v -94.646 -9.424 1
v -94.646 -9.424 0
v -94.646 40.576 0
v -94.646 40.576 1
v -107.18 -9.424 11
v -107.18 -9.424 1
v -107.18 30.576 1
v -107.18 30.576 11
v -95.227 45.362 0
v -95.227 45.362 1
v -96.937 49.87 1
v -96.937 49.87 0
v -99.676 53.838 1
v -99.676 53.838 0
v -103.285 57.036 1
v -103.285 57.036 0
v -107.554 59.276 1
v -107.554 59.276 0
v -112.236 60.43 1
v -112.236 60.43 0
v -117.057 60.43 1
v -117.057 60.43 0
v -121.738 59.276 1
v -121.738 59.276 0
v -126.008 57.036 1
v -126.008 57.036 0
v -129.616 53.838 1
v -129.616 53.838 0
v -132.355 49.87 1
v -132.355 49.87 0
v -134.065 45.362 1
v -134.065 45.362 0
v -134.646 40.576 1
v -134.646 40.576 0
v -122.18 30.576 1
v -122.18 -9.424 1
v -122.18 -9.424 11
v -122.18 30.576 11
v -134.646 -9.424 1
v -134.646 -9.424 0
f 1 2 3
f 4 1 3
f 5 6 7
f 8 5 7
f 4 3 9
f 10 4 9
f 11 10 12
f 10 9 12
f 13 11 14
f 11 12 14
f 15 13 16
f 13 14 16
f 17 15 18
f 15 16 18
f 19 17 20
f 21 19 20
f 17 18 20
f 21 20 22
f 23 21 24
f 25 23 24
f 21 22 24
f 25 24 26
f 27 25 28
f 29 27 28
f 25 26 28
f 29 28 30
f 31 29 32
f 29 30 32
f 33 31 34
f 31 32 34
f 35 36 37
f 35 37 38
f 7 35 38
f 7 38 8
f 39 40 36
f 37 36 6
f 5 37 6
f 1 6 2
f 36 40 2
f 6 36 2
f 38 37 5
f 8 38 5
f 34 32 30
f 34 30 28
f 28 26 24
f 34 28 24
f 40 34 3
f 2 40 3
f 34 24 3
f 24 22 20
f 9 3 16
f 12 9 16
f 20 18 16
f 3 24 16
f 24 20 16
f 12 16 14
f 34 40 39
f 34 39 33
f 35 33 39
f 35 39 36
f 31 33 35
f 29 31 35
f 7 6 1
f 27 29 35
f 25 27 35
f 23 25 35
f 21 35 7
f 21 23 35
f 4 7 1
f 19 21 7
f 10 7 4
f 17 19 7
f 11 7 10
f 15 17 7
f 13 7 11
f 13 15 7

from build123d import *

# Parameters (mm, degrees)
F0_W     = 40
F0_H     = 50
F1_DEPTH = 1
F2_W     = 15
F2_H     = 40
F3_DEPTH = 10


with BuildPart() as f1:
    # F0 (on Top) → F1 (new body)
    with BuildSketch(Plane.XY):
        with Locations((-114.646277, 15.575861)):
            Rectangle(F0_W, F0_H)
        with BuildLine():
            ThreePointArc((-94.646277, 40.575861), (-114.646277, 60.575861), (-134.646277, 40.575861))
            Line((-134.646277, 40.575861), (-94.646277, 40.575861))
        make_face()
    extrude(amount=F1_DEPTH)

    # F2 (on face) → F3 (join)
    with BuildSketch(Plane.XY.offset(1)):
        with Locations((-114.680499, 10.575861)):
            Rectangle(F2_W, F2_H)
    extrude(amount=F3_DEPTH)


solid = f1.part
